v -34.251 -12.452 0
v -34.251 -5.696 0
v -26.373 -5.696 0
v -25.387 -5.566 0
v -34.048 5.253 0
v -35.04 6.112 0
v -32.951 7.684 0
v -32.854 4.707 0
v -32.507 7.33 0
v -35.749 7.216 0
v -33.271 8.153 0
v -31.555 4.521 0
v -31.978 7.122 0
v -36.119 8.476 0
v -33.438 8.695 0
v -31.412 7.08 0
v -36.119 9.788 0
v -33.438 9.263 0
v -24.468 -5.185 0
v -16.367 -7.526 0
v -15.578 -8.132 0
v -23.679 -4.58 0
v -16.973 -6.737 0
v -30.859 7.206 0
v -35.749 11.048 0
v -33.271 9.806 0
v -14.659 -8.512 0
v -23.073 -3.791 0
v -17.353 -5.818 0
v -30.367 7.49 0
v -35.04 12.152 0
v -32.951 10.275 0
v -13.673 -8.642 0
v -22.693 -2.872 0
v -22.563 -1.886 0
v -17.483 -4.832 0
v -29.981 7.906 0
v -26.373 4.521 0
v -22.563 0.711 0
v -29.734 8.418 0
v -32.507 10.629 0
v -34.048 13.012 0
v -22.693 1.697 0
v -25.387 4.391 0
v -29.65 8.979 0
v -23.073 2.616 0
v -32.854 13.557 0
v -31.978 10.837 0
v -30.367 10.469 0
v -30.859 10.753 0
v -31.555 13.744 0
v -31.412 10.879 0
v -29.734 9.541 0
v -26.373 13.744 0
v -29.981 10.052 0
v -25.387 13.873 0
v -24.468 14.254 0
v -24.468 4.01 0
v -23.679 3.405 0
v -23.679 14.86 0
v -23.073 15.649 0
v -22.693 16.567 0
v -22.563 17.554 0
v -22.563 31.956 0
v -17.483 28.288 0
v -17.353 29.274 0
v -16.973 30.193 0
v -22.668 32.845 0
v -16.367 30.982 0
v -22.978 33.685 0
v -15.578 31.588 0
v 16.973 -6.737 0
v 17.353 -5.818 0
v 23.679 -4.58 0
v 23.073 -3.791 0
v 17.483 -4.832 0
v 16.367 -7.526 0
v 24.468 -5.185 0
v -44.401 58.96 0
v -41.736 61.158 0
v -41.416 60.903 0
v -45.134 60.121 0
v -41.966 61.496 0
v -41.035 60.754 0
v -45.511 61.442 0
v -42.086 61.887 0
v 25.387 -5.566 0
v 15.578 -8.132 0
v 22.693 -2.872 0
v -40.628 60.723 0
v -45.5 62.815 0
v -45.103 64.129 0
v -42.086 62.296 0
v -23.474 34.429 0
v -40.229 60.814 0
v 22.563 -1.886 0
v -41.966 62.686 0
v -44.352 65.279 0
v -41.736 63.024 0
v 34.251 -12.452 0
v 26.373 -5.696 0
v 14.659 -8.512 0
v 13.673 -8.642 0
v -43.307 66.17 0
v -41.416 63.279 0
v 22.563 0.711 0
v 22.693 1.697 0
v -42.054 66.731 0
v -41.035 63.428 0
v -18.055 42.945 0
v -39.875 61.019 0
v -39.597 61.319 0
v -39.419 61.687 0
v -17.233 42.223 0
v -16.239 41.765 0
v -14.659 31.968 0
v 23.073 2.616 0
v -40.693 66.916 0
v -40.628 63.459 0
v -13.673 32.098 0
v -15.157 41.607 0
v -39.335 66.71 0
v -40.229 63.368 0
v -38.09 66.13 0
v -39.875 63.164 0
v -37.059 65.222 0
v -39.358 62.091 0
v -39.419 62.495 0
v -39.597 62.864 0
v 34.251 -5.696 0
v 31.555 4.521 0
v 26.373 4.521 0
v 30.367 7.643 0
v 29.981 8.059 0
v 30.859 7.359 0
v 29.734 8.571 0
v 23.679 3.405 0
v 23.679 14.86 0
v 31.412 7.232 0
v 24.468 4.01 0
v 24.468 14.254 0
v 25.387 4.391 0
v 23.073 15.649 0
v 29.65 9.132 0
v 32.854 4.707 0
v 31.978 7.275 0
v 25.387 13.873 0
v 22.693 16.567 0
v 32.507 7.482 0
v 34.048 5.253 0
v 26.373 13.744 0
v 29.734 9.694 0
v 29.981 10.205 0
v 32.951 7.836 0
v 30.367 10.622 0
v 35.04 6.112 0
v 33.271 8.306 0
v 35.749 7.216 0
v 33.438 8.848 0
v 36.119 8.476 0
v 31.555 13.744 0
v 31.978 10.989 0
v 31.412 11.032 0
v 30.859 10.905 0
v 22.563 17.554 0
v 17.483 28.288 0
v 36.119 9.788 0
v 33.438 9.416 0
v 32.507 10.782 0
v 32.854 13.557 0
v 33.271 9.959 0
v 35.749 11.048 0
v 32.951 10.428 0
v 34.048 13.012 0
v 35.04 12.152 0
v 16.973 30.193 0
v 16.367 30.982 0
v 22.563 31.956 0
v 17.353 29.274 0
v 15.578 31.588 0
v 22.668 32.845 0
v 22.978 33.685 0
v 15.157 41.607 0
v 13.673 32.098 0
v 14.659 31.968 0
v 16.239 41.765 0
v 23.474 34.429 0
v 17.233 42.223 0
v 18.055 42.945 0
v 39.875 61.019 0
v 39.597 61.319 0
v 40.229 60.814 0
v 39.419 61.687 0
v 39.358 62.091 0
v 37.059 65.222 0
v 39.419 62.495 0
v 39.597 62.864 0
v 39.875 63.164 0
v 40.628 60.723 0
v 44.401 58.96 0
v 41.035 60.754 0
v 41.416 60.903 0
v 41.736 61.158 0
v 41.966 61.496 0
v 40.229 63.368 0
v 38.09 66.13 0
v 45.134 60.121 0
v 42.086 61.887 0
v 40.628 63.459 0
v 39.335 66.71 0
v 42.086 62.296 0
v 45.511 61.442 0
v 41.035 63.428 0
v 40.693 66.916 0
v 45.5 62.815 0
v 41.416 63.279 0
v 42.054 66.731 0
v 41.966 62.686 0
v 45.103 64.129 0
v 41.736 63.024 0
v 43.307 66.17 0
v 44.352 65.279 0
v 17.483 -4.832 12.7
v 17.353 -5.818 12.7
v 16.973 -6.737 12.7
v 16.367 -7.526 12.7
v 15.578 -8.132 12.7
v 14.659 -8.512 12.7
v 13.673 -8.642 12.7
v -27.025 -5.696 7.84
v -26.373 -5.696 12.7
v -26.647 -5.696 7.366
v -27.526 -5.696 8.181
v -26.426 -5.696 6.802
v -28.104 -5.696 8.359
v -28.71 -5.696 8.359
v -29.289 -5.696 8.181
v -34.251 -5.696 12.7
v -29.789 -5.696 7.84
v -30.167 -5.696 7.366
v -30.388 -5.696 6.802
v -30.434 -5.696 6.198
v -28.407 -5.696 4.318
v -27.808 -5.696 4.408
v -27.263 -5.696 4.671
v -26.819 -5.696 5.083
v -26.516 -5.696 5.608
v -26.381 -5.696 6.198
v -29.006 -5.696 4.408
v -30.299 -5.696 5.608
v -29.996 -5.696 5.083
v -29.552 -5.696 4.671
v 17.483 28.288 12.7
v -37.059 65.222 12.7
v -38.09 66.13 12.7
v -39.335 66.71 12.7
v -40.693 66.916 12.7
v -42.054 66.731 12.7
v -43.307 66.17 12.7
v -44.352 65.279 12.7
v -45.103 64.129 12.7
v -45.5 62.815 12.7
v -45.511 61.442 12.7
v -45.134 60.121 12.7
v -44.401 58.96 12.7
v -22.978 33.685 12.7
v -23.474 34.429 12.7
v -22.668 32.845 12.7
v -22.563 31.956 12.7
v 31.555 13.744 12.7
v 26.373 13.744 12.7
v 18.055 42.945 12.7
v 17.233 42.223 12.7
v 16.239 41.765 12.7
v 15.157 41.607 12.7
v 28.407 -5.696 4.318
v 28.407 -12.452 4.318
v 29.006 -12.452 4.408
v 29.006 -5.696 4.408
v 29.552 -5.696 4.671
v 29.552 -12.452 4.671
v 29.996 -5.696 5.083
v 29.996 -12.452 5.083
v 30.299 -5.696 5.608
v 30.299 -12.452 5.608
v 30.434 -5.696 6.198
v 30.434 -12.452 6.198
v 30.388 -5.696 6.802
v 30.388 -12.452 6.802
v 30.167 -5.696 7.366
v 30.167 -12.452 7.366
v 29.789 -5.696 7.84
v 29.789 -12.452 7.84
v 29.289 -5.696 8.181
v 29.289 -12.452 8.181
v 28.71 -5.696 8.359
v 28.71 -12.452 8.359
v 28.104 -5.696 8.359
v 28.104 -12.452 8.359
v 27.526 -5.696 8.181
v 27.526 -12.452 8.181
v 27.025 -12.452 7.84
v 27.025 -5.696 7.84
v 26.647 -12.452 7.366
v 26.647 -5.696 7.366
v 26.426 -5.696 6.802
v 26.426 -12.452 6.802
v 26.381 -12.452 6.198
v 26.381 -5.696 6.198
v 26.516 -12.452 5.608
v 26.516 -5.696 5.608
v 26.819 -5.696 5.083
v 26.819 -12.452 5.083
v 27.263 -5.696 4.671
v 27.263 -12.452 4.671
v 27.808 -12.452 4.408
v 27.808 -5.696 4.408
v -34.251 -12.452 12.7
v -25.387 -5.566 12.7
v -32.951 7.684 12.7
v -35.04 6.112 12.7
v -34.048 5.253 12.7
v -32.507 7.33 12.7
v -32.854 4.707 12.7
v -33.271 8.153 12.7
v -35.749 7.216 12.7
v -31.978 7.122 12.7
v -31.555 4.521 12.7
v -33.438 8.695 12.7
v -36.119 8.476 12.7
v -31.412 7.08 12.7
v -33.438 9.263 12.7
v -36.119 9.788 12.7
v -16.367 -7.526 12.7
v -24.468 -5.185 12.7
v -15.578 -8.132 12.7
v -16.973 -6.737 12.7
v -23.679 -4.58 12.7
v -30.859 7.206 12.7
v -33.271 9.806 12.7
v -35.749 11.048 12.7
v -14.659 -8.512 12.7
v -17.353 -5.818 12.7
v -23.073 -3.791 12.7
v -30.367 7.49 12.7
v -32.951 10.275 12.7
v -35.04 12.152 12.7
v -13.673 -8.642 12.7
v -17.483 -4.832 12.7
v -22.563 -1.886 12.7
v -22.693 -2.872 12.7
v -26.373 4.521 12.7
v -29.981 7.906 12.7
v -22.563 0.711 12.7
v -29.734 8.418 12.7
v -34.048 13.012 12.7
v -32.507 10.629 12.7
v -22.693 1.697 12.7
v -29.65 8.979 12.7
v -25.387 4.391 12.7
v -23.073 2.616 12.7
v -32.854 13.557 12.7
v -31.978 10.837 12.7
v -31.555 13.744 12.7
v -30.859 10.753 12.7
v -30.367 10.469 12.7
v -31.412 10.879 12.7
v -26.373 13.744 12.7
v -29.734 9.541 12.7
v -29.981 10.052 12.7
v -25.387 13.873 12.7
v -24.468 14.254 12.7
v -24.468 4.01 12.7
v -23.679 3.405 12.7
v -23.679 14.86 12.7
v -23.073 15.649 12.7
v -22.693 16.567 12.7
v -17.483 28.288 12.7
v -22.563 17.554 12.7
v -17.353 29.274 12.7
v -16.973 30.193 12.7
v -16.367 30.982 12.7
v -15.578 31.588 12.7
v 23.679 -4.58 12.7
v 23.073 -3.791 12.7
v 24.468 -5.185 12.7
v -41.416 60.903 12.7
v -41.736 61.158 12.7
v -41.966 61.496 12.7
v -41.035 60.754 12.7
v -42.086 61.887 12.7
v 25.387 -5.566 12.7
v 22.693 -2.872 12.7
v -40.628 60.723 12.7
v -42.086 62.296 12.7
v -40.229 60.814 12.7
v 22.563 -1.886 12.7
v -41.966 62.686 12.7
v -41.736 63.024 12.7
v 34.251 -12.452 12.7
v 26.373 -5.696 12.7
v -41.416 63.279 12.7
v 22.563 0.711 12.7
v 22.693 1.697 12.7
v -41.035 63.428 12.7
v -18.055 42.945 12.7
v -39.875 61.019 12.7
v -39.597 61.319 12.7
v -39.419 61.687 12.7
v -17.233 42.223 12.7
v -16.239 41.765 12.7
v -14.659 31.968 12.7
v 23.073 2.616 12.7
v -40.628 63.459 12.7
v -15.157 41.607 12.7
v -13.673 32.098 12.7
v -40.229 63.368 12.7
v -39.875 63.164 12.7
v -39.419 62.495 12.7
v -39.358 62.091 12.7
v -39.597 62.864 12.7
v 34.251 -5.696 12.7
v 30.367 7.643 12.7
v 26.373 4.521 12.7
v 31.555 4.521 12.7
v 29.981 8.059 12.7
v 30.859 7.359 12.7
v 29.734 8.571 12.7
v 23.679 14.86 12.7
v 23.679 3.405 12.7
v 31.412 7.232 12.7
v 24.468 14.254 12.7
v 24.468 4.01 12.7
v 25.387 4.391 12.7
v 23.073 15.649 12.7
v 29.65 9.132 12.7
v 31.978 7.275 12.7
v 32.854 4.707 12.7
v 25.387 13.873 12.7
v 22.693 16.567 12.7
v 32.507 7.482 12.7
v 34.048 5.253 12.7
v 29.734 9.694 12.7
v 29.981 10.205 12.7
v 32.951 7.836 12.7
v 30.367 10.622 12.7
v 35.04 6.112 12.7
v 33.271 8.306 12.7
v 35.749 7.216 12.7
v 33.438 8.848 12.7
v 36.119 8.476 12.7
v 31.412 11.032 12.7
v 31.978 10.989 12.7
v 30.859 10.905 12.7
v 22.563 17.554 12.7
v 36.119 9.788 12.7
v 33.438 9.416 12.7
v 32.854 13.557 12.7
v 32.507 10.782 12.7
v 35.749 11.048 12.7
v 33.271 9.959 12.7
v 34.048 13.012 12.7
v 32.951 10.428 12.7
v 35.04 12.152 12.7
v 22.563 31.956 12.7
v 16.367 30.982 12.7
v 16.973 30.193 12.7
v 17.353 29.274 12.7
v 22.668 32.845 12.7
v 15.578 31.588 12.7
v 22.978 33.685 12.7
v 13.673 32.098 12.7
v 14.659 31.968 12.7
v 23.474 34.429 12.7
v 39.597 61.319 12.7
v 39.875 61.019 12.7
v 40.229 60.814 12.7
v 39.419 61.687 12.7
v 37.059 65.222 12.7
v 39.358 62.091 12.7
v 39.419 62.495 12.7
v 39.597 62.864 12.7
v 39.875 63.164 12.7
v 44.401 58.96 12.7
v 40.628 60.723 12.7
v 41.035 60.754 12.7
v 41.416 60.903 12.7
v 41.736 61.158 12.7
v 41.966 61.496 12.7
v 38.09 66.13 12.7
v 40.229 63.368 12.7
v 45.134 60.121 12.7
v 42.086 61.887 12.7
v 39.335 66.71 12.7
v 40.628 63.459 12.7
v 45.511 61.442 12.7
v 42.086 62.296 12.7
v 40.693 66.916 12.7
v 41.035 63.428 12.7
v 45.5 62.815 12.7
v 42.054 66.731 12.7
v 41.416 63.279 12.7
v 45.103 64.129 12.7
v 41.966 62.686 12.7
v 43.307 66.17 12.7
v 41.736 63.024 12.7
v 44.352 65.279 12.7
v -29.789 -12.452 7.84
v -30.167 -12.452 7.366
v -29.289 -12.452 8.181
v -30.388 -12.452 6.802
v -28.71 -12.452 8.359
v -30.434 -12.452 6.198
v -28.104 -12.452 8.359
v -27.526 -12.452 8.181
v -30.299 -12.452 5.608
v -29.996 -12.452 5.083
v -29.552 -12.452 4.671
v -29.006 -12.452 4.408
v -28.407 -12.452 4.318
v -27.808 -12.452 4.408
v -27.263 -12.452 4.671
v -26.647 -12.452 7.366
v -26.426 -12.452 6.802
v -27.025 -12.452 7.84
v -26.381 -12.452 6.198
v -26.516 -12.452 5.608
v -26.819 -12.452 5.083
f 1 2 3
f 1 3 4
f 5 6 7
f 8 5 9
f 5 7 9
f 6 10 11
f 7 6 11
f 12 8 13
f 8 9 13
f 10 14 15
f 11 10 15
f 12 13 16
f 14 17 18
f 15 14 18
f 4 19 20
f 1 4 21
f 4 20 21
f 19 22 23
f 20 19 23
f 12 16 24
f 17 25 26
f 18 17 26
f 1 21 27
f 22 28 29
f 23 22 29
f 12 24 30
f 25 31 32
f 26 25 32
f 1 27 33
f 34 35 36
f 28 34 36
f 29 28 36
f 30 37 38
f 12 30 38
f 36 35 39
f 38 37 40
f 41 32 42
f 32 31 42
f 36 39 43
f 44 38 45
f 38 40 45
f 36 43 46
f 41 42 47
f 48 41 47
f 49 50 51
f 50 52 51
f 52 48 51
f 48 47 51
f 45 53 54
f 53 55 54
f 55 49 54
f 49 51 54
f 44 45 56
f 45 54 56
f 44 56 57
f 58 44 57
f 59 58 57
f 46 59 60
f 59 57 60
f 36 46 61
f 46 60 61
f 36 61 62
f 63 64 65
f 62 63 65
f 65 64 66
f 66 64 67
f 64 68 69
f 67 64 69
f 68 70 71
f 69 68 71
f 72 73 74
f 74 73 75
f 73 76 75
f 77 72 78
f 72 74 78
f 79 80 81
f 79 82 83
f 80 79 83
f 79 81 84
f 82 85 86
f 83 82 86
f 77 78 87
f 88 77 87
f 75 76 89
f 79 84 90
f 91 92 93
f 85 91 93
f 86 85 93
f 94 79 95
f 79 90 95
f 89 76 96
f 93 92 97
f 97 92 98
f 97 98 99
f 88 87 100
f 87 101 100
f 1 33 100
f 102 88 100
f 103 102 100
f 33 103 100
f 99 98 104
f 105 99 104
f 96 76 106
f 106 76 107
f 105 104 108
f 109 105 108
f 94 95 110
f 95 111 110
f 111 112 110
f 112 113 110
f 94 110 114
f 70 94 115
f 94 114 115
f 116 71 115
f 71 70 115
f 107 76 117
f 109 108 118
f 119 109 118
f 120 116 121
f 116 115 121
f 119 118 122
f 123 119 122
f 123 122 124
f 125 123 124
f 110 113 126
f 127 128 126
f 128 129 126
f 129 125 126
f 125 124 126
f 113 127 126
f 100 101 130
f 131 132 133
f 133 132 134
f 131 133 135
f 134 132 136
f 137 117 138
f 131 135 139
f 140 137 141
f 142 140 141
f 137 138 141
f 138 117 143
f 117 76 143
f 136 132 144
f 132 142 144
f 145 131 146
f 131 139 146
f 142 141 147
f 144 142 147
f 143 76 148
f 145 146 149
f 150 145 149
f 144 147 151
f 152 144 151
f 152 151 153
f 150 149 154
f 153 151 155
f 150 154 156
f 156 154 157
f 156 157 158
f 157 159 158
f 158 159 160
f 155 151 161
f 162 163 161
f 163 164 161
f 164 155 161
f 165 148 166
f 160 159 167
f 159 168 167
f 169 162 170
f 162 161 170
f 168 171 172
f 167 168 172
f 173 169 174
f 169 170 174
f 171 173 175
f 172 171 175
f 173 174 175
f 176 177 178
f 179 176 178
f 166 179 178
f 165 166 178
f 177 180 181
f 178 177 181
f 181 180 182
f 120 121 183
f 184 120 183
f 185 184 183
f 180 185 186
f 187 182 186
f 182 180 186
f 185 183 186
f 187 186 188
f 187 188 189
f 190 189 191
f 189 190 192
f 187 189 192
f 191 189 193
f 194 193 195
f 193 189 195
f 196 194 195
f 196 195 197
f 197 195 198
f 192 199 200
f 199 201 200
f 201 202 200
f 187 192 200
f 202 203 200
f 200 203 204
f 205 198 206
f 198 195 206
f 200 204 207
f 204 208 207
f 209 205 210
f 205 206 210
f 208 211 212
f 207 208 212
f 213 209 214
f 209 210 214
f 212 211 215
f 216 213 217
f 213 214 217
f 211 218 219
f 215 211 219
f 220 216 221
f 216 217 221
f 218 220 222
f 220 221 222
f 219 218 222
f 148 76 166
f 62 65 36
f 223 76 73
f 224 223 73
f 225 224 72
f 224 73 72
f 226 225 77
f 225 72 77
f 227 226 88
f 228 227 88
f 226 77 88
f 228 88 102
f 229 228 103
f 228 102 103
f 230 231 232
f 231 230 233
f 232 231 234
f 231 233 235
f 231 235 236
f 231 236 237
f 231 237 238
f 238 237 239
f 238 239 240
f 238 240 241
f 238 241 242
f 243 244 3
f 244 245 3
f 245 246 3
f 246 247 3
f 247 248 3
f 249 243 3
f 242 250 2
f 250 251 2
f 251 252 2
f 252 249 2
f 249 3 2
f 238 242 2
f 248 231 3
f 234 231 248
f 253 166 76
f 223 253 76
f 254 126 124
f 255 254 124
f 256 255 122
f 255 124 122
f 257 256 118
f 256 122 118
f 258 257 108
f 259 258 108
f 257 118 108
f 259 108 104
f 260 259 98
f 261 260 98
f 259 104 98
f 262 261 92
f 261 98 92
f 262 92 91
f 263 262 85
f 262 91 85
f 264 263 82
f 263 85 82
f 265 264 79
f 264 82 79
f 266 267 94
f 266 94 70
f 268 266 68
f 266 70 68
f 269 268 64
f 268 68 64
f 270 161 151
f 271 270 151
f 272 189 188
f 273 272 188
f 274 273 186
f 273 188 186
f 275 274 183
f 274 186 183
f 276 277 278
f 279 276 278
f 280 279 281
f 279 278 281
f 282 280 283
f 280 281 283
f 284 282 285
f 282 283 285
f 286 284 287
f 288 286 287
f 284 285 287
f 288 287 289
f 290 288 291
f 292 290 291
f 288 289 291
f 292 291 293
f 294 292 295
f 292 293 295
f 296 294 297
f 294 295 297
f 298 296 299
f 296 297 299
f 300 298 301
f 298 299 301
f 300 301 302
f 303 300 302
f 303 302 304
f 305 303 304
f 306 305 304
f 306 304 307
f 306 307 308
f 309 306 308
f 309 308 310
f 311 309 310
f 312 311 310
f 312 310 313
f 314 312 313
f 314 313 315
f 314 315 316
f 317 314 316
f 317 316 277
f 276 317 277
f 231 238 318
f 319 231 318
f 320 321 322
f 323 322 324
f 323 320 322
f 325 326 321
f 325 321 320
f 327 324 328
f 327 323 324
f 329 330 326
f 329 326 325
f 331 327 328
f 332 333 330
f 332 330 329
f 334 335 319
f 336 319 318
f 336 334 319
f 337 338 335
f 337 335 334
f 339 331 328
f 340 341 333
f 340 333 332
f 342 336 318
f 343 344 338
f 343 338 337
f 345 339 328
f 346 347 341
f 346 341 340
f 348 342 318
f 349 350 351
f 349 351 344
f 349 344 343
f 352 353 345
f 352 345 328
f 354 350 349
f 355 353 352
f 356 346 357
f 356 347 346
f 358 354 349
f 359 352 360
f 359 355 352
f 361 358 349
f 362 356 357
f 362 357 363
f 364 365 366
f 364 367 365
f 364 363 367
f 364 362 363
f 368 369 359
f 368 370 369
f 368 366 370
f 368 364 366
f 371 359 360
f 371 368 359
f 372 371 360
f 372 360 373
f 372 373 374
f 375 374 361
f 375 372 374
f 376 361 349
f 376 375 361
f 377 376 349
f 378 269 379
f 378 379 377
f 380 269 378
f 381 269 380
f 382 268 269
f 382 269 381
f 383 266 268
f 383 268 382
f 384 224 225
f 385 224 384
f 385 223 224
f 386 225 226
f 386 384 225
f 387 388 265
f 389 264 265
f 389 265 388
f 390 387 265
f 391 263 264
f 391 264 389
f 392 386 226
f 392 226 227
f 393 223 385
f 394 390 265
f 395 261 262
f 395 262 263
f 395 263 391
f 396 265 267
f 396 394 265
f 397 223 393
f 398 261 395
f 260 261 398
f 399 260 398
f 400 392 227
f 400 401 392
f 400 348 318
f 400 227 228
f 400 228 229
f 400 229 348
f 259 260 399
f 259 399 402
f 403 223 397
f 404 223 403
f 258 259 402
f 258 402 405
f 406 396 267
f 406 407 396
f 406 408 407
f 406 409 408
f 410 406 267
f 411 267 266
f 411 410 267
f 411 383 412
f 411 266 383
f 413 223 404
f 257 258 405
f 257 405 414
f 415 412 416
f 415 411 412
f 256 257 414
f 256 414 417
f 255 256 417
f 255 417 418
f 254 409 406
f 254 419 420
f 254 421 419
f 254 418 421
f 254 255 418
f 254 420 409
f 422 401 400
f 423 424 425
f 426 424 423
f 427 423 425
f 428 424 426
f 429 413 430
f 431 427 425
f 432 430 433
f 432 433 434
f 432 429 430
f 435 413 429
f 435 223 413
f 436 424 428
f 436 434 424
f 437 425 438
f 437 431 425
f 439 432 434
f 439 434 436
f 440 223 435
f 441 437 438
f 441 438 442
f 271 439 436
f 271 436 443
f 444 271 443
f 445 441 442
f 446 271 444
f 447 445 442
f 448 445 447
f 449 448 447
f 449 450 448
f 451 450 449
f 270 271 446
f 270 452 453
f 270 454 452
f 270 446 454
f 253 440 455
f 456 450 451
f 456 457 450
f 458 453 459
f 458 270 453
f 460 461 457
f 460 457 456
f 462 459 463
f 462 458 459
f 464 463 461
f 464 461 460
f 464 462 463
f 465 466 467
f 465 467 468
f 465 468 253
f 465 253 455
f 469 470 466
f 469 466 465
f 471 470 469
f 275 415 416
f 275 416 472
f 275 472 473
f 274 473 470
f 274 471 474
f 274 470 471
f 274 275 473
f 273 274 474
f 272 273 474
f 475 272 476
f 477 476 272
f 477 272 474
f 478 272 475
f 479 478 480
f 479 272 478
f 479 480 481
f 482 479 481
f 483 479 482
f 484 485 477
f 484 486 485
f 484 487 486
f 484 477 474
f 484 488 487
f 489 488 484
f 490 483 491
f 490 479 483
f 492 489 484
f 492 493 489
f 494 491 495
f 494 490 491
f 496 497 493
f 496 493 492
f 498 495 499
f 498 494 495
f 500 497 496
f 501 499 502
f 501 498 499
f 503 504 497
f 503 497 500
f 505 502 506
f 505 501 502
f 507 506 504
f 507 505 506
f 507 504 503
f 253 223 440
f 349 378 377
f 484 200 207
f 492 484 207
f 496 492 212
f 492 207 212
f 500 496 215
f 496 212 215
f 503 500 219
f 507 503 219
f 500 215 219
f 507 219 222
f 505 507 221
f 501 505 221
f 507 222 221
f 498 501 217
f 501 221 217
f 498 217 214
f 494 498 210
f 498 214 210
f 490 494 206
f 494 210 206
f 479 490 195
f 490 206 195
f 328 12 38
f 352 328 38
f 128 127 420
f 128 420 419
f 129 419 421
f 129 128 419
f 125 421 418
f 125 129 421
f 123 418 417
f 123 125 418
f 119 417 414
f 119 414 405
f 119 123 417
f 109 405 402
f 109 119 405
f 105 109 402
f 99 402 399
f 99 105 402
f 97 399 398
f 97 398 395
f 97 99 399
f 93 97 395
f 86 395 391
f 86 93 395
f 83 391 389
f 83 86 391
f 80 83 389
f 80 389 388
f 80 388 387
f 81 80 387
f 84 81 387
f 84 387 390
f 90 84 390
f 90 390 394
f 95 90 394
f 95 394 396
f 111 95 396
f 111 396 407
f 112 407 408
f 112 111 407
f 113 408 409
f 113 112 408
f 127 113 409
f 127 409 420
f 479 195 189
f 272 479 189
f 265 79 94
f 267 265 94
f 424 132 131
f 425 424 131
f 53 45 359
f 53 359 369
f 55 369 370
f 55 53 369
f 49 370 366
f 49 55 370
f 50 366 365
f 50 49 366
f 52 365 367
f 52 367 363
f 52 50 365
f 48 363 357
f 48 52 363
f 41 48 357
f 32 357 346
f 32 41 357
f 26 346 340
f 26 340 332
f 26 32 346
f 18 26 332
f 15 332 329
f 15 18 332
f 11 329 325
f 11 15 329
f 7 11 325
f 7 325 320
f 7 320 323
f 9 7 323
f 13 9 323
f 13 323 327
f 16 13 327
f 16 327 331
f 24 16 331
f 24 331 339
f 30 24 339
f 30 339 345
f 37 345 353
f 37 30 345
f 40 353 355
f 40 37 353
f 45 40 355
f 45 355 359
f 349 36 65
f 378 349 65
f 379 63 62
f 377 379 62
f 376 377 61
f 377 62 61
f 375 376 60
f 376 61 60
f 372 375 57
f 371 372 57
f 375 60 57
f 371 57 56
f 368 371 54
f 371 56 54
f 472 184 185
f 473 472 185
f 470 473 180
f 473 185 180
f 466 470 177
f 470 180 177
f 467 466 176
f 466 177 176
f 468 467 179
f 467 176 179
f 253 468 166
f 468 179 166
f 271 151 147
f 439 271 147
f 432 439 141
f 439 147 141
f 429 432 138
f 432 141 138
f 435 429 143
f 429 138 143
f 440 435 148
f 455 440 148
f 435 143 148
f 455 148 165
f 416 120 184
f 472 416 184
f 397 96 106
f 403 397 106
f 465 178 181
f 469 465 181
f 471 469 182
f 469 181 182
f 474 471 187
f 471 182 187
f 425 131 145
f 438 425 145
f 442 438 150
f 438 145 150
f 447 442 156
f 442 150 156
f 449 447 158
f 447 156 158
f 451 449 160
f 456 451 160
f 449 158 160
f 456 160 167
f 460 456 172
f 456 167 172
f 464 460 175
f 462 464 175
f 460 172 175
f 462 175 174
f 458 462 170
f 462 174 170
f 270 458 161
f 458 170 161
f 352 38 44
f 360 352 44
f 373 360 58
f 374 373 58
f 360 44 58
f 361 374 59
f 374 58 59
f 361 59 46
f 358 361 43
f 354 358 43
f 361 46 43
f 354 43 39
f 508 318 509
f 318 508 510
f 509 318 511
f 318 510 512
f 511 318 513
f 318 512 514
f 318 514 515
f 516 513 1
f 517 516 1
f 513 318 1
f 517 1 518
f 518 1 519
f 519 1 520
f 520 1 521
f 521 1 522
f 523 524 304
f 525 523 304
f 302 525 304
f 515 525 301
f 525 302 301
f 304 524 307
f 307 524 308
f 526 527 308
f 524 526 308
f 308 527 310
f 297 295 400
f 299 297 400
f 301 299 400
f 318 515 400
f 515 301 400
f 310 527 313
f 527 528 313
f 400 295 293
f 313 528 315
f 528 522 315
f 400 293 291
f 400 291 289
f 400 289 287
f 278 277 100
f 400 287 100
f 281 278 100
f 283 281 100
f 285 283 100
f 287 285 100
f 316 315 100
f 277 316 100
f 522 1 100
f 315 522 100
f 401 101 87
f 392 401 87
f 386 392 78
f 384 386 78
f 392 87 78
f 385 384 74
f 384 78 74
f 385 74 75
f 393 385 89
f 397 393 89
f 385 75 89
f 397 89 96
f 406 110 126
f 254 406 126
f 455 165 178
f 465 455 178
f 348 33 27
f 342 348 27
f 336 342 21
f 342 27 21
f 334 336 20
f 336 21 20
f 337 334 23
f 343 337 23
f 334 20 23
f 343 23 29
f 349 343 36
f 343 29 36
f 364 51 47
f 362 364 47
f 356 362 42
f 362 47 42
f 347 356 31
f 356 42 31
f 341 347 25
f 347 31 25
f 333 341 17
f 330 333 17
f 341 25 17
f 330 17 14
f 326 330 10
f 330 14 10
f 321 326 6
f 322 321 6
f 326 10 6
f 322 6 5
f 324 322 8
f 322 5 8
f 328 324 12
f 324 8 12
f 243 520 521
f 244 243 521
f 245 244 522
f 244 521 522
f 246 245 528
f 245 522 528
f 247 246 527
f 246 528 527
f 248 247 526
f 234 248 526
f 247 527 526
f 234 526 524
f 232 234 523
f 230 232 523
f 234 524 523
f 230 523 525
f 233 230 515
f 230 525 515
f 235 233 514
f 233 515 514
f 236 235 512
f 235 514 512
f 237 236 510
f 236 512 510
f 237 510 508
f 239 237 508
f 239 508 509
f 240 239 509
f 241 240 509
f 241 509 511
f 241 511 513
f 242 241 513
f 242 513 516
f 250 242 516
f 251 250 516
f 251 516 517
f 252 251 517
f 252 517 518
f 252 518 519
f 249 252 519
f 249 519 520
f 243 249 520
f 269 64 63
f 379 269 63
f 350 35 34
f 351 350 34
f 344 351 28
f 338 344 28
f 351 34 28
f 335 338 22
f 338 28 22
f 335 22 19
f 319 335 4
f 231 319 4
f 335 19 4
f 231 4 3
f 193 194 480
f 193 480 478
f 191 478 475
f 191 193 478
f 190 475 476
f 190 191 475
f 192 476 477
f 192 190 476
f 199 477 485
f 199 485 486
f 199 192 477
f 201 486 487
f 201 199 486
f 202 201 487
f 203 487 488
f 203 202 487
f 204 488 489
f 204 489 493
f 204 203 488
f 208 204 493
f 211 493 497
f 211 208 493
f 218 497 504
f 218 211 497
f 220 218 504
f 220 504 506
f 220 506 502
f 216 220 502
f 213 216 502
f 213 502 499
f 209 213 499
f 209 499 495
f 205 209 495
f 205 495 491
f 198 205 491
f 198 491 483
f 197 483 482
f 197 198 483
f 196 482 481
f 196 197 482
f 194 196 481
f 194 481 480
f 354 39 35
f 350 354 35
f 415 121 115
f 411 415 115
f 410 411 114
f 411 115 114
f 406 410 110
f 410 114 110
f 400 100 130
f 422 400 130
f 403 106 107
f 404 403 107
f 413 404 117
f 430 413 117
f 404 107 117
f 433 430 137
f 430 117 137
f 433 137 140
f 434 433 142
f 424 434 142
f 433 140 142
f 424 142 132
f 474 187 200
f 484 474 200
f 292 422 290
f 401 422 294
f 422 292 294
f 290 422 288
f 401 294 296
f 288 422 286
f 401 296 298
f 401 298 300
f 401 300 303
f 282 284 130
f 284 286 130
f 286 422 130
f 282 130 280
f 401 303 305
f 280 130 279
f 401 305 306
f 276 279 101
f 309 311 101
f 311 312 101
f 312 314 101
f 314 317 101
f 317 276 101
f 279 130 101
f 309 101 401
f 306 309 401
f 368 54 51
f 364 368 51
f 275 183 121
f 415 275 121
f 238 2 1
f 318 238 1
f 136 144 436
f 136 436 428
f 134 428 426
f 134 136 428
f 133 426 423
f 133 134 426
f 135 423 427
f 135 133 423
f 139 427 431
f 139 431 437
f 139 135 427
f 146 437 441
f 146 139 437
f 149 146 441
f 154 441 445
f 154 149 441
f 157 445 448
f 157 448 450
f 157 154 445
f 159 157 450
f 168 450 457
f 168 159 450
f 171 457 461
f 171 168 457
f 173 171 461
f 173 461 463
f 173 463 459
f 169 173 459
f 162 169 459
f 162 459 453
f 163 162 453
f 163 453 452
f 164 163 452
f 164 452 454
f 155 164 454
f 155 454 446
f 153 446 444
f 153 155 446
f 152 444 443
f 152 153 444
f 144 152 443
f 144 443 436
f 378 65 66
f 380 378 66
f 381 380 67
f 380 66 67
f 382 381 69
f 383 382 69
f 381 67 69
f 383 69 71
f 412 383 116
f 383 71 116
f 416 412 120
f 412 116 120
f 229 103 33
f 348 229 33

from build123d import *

# Parameters (mm, degrees)
SKETCH1_R      = 1.3716
SKETCH1_R_2    = 1.905
EXTRUDE1_DEPTH = 12.7
SKETCH2_R      = 2.032
EXTRUDE2_DEPTH = 9.652


with BuildPart() as part:
    # Sketch1 → Extrude1 (new body)
    with BuildSketch(Plane.XY):
        with BuildLine():
            Line((-44.40070708, 58.959918893), (-23.474438879, 34.429033799))
            ThreePointArc((-23.474438879, 34.429033799), (-22.79815009, 33.273999736), (-22.563049012, 31.956351187))
            Line((-22.563049012, 31.956351187), (-22.563049012, 17.553595327))
            ThreePointArc((-22.563049012, 17.553595327), (-23.678972175, 14.85951849), (-26.373049012, 13.743595327))
            Line((-26.373049012, 13.743595327), (-31.554570289, 13.743595327))
            ThreePointArc((-31.554570289, 13.743595327), (-36.166042792, 9.132122824), (-31.554570289, 4.520650321))
            Line((-31.554570289, 4.520650321), (-26.373049012, 4.520650321))
            ThreePointArc((-26.373049012, 4.520650321), (-23.678972175, 3.404727157), (-22.563049012, 0.710650321))
            Line((-22.563049012, 0.710650321), (-22.563049012, -1.885593273))
            ThreePointArc((-22.563049012, -1.885593273), (-23.678972175, -4.579670109), (-26.373049012, -5.695593273))
            Line((-26.373049012, -5.695593273), (-34.251425283, -5.695593273))
            Line((-34.251425283, -5.695593273), (-34.251425283, -12.452071481))
            Line((-34.251425283, -12.452071481), (34.251425283, -12.452071481))
            Line((34.251425283, -12.452071481), (34.251425283, -5.695593273))
            Line((34.251425283, -5.695593273), (26.373049012, -5.695593273))
            ThreePointArc((26.373049012, -5.695593273), (23.678972175, -4.579670109), (22.563049012, -1.885593273))
            Line((22.563049012, -1.885593273), (22.563049012, 0.710650321))
            ThreePointArc((22.563049012, 0.710650321), (23.678972175, 3.404727157), (26.373049012, 4.520650321))
            Line((26.373049012, 4.520650321), (31.554570289, 4.520650321))
            ThreePointArc((31.554570289, 4.520650321), (36.166042792, 9.132122824), (31.554570289, 13.743595327))
            Line((31.554570289, 13.743595327), (26.373049012, 13.743595327))
            ThreePointArc((26.373049012, 13.743595327), (23.678972175, 14.85951849), (22.563049012, 17.553595327))
            Line((22.563049012, 17.553595327), (22.563049012, 31.956351187))
            ThreePointArc((22.563049012, 31.956351187), (22.79815009, 33.273999736), (23.474438879, 34.429033799))
            Line((23.474438879, 34.429033799), (44.40070708, 58.959918893))
            ThreePointArc((44.40070708, 58.959918893), (43.861334165, 65.761850412), (37.059402646, 65.222477498))
            Line((37.059402646, 65.222477498), (18.05525325, 42.944802345))
            ThreePointArc((18.05525325, 42.944802345), (16.752760164, 41.957931463), (15.156643118, 41.607484957))
            Line((15.156643118, 41.607484957), (-15.156643118, 41.607484957))
            ThreePointArc((-15.156643118, 41.607484957), (-16.752760164, 41.957931463), (-18.05525325, 42.944802345))
            Line((-18.05525325, 42.944802345), (-37.059402646, 65.222477498))
            ThreePointArc((-37.059402646, 65.222477498), (-43.861334165, 65.761850412), (-44.40070708, 58.959918893))
        make_face()
        with Locations((-40.730054863, 62.091198195)):
            Circle(SKETCH1_R, mode=Mode.SUBTRACT)
        with Locations(Location((31.554570289, 9.132122824, 0), (0, 0, 180))):
            Circle(SKETCH1_R_2, mode=Mode.SUBTRACT)
        with Locations(Location((40.730054863, 62.091198195, 0), (0, 0, 180))):
            Circle(SKETCH1_R, mode=Mode.SUBTRACT)
        with Locations((-31.554570289, 8.979309022)):
            Circle(SKETCH1_R_2, mode=Mode.SUBTRACT)
        with BuildLine():
            Line((-13.673049012, 32.09814334), (13.673049012, 32.09814334))
            ThreePointArc((13.673049012, 32.09814334), (16.367125848, 30.982220177), (17.483049012, 28.28814334))
            Line((17.483049012, 28.28814334), (17.483049012, -4.832071481))
            ThreePointArc((17.483049012, -4.832071481), (16.367125848, -7.526148317), (13.673049012, -8.642071481))
            Line((13.673049012, -8.642071481), (-13.673049012, -8.642071481))
            ThreePointArc((-13.673049012, -8.642071481), (-16.367125848, -7.526148317), (-17.483049012, -4.832071481))
            Line((-17.483049012, -4.832071481), (-17.483049012, 28.28814334))
            ThreePointArc((-17.483049012, 28.28814334), (-16.367125848, 30.982220177), (-13.673049012, 32.09814334))
        make_face(mode=Mode.SUBTRACT)
    extrude(amount=EXTRUDE1_DEPTH)

    # Sketch2 → Extrude2 (cut)
    with BuildSketch(Plane.XZ.offset(12.452071481)):
        with Locations(Location((28.407237147, 6.35, 0), (0, 0, 270))):
            Circle(SKETCH2_R)
        with Locations(Location((-28.407237147, 6.35, 0), (0, 0, 270))):
            Circle(SKETCH2_R)
    extrude(amount=-EXTRUDE2_DEPTH, mode=Mode.SUBTRACT)


solid = part.part
